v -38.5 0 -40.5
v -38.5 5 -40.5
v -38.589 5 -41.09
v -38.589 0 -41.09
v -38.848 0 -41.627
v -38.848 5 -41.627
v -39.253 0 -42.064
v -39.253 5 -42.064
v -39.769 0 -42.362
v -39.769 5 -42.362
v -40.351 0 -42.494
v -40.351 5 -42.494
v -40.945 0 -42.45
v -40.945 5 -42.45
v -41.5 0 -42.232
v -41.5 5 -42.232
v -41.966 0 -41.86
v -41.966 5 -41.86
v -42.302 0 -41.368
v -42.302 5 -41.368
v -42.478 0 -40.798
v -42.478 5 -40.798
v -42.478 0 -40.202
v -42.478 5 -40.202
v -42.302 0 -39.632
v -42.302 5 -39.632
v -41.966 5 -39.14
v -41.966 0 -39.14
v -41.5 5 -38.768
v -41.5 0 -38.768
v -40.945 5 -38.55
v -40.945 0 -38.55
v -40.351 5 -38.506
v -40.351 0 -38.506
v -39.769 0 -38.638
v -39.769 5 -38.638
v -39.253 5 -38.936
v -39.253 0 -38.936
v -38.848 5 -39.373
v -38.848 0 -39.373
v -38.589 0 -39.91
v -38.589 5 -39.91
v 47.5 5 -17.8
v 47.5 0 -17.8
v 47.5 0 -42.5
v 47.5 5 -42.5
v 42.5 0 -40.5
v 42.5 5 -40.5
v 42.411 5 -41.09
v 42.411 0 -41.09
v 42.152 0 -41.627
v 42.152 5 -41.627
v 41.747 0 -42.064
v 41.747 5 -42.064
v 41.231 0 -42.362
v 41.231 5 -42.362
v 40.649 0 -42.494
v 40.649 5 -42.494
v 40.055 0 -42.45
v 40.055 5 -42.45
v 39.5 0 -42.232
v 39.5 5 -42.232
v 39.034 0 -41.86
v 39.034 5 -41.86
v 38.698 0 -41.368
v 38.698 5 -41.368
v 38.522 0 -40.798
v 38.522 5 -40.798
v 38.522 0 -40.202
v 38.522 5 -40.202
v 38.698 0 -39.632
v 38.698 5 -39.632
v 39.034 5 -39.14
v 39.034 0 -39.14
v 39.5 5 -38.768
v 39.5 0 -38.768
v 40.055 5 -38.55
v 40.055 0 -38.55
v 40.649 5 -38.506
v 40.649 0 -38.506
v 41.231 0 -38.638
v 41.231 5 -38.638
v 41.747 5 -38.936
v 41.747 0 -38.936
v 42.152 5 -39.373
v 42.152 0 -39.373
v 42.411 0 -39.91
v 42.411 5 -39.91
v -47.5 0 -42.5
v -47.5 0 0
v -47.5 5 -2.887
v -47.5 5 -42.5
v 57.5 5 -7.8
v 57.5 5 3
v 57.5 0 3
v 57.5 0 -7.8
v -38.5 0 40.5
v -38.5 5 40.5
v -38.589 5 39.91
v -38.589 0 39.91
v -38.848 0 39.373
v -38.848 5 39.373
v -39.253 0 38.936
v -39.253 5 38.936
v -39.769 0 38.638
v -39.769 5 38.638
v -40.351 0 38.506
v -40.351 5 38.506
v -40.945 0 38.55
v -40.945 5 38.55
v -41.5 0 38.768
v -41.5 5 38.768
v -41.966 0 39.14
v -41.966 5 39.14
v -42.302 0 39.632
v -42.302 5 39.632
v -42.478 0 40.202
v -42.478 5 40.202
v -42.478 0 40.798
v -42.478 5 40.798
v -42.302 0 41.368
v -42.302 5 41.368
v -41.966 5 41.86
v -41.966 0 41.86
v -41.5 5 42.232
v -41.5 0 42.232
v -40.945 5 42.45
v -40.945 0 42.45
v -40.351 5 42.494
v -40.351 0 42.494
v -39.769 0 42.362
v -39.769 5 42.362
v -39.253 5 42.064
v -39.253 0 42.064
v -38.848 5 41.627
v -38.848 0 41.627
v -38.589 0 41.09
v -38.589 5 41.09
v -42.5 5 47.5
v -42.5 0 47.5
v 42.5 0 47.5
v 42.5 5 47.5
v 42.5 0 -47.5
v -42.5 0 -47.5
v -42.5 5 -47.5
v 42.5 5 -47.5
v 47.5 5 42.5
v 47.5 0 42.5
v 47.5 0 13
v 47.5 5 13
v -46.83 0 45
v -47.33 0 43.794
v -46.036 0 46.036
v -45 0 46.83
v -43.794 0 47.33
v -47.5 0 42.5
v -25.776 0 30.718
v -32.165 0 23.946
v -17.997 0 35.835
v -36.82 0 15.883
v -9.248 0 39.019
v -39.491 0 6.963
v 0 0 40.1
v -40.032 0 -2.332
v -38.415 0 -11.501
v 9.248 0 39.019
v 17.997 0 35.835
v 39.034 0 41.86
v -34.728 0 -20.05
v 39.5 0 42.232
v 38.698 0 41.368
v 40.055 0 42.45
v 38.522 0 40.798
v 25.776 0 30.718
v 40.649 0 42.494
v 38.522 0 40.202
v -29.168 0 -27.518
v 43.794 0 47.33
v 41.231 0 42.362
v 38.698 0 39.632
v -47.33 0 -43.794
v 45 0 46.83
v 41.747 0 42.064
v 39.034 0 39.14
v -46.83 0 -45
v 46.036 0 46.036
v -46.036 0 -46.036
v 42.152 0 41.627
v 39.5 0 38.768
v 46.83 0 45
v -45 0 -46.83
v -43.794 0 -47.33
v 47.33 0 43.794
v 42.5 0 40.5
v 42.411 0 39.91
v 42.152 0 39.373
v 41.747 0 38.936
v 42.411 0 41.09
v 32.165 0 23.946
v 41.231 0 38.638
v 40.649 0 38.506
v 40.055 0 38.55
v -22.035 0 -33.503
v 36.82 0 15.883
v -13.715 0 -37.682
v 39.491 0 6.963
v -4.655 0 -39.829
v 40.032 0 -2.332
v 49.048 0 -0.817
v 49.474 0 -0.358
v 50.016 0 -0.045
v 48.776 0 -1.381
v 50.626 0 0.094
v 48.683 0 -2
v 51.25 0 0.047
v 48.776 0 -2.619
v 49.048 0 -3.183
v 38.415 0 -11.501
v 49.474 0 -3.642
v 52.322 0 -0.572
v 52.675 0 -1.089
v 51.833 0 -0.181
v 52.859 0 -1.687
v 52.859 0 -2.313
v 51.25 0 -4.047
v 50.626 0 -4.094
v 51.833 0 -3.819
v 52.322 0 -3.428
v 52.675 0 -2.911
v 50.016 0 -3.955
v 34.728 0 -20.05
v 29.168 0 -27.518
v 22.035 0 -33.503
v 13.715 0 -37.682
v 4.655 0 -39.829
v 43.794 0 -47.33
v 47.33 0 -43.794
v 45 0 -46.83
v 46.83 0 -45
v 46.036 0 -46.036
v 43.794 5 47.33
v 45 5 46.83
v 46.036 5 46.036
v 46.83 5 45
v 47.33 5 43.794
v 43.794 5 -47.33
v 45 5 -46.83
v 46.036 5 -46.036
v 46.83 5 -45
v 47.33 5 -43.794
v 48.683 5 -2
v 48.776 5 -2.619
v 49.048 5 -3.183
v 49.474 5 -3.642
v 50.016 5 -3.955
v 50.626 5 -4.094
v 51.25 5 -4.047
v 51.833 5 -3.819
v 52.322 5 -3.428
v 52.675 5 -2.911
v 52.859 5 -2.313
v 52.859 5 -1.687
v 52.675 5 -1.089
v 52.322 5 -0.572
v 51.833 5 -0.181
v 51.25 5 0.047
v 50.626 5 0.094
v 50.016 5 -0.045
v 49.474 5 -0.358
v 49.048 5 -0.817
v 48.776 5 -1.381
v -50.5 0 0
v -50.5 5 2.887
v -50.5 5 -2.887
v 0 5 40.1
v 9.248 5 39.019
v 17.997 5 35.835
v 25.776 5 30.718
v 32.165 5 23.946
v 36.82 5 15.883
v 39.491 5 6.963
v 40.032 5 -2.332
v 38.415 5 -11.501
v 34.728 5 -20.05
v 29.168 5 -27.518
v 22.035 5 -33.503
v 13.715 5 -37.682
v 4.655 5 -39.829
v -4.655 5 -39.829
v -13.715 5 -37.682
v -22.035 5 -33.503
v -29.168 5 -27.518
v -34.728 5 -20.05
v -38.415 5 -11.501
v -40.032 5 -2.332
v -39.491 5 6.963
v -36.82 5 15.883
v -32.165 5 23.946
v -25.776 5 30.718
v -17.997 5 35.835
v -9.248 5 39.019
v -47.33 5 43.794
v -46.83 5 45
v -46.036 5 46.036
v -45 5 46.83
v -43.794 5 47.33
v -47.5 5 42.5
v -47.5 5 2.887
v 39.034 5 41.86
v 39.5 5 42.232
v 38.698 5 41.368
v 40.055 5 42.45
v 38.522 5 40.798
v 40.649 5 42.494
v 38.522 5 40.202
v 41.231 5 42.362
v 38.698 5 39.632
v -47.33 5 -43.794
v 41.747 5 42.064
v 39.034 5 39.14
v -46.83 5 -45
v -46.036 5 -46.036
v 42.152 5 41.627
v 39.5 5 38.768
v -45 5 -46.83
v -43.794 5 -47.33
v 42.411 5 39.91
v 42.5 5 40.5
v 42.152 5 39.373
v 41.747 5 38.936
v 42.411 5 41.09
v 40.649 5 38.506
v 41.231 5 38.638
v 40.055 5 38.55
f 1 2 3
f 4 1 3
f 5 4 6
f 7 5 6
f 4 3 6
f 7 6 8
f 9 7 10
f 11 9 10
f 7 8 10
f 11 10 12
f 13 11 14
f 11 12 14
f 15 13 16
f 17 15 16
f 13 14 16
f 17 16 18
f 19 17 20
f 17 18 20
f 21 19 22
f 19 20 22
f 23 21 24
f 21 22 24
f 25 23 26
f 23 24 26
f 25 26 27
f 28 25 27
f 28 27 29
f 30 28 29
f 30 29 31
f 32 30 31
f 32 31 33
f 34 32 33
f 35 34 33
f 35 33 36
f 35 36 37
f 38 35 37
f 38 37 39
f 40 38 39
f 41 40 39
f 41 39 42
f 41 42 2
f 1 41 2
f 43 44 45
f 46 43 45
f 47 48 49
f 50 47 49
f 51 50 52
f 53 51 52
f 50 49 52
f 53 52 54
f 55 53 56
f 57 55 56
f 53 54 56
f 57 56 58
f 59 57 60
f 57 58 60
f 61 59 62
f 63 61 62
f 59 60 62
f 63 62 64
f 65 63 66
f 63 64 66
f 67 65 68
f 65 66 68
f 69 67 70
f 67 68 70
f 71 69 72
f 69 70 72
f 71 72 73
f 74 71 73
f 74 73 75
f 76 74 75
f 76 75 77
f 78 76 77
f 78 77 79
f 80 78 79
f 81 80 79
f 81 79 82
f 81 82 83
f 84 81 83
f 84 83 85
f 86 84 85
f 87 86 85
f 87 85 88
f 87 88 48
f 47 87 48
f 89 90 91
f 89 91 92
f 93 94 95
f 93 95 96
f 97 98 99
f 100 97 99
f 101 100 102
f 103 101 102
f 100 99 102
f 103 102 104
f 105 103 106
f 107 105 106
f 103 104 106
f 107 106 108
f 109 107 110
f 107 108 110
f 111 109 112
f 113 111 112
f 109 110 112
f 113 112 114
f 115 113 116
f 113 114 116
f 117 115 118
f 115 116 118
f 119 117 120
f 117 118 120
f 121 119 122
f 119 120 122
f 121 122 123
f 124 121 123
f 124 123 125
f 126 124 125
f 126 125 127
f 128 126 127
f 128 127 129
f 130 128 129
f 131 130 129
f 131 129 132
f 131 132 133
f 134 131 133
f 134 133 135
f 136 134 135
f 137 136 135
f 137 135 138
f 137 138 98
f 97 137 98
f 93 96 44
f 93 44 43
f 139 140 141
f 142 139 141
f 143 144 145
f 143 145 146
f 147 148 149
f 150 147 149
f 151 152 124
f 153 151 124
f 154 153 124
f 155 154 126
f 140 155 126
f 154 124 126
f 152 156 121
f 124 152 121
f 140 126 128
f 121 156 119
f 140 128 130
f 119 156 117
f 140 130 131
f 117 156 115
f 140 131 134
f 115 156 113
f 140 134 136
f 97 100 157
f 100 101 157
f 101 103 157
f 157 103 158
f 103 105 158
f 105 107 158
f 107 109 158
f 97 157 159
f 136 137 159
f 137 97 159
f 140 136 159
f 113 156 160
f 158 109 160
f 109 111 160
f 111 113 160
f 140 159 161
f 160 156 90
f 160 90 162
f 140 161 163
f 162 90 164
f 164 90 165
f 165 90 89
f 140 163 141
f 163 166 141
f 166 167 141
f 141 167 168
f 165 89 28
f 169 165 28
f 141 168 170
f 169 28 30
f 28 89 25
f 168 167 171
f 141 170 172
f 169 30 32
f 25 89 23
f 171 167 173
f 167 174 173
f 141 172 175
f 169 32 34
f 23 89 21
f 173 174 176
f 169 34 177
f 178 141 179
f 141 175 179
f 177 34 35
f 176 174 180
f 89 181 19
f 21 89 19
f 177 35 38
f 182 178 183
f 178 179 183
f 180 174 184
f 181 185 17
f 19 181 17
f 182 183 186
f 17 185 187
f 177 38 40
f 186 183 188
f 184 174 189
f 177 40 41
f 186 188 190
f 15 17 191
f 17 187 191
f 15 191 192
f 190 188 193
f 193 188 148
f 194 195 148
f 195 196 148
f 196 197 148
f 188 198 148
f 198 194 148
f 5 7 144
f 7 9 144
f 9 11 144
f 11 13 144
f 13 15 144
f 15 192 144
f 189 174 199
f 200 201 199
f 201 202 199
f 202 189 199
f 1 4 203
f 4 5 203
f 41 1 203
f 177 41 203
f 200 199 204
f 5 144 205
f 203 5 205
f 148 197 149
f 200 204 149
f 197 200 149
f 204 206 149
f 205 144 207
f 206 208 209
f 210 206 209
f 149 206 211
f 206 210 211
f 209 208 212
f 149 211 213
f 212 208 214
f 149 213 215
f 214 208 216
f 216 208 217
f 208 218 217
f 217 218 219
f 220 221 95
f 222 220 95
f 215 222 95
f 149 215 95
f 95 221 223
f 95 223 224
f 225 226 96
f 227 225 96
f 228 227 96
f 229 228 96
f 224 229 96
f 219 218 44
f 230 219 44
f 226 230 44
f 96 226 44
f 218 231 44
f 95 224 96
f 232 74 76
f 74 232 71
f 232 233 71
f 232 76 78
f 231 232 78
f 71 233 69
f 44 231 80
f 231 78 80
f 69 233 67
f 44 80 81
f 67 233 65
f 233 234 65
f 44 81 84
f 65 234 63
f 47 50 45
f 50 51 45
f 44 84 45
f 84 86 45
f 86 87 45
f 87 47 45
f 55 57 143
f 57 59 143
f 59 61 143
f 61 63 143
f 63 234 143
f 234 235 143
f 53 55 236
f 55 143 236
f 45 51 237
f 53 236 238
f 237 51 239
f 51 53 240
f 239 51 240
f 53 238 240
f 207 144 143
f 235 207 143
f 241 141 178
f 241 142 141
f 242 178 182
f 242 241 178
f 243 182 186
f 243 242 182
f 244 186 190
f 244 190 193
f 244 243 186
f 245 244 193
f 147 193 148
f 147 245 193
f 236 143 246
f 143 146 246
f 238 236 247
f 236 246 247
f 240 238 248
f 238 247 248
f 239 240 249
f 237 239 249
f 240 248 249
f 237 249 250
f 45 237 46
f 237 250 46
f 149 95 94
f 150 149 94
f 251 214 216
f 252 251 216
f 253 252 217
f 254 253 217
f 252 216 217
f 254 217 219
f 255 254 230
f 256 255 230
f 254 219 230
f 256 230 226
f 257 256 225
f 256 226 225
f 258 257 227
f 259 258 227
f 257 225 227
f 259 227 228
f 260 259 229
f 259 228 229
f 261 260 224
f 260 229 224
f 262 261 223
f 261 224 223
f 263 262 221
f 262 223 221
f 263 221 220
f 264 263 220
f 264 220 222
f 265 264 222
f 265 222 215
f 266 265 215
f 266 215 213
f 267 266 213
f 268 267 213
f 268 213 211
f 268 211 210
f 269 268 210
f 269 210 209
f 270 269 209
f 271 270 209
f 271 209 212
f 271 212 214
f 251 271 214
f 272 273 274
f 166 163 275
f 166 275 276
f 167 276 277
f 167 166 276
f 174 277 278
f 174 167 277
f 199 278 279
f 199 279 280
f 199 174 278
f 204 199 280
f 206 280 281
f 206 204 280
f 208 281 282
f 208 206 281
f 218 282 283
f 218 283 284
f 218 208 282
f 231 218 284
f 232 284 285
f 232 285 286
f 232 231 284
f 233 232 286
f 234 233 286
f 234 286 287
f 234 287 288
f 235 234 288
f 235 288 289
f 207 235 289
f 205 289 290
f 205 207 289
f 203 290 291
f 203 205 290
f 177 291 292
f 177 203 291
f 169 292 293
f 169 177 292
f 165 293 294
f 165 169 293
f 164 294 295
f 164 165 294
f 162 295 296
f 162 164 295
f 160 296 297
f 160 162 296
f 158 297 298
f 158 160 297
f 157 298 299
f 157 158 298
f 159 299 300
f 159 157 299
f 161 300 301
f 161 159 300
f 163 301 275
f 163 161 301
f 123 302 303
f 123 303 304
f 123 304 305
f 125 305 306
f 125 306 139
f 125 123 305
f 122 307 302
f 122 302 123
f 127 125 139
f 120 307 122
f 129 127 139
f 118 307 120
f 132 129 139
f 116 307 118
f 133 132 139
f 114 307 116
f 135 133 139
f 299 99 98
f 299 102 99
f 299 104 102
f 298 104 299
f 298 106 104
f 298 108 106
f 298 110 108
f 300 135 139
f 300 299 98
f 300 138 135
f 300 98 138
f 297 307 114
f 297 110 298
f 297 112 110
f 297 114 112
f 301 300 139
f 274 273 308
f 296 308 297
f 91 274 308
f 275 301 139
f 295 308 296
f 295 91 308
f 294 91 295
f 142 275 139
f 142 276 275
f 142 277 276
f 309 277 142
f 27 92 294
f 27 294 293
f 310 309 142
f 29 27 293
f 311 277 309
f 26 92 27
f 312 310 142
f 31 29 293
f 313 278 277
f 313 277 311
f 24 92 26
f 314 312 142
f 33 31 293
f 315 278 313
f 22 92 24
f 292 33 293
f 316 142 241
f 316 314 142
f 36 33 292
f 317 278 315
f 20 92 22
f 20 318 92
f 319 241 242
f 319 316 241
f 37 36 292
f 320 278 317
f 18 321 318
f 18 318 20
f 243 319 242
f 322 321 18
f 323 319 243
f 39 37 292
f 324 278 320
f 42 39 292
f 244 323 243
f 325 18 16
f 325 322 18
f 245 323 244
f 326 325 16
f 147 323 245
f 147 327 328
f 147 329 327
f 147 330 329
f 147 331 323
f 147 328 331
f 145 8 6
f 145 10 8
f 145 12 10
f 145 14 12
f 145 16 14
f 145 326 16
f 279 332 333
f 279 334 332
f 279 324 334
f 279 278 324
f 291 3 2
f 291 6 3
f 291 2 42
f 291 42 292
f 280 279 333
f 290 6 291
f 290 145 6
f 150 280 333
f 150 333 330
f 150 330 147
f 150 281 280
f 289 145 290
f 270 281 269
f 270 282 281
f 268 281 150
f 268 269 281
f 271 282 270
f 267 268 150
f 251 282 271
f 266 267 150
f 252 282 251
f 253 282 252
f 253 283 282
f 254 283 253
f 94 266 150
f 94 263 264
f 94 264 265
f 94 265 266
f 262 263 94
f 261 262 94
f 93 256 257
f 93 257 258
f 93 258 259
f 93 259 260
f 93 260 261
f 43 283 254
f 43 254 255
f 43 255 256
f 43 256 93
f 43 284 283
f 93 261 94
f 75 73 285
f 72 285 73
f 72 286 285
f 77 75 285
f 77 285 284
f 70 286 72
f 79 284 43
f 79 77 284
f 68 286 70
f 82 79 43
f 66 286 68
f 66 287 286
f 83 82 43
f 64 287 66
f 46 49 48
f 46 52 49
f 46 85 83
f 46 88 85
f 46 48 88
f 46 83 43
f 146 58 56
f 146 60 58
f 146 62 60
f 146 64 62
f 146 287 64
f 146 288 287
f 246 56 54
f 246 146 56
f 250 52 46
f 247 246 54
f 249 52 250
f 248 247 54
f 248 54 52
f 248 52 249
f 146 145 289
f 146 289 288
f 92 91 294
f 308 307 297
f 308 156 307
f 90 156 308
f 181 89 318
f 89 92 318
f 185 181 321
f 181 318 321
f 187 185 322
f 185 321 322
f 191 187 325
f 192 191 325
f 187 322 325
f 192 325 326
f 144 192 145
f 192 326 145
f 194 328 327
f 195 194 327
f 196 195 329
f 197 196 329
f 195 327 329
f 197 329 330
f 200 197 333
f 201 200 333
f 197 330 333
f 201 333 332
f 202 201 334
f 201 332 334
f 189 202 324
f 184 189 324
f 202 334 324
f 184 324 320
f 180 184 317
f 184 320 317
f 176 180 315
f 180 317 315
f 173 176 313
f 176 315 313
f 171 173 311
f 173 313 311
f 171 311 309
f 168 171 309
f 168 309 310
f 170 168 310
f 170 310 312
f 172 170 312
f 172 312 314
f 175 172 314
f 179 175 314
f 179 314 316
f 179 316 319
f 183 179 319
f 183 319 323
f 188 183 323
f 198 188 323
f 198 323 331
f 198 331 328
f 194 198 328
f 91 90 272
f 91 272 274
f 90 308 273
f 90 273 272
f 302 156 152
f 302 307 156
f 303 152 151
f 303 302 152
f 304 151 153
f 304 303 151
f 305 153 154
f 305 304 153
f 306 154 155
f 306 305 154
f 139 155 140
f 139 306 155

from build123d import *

# Parameters (mm, degrees)
SKETCH1_W                       = 95
SKETCH1_H                       = 95
SKETCH1_W_2                     = 81
SKETCH1_H_2                     = 81
SKETCH1_R                       = 40.1
BOSS_EXTRUDE1_DEPTH             = 5
F_4_0MM_DOWEL_HOLE1_D           = 4
BOSS_EXTRUDE2_DEPTH             = 3
FILLET1_R                       = 5
SKETCH6_W                       = 3
SKETCH6_H                       = 5
SKETCH6_W_2                     = 4.8
BOSS_EXTRUDE3_DEPTH             = 10
TAP_DRILL_FOR_M5X0_8_TAP1_D     = 4.2
TAP_DRILL_FOR_M5X0_8_TAP1_DEPTH = 12
TAP_DRILL_FOR_M5X0_8_TAP1_TIP   = 1.2618073
CHAMFER1_SIZE                   = 10


with BuildPart() as part:
    # Sketch1 → Boss-Extrude1 (new body)
    # profile 1 of 2: a face of its own
    with BuildSketch(Plane(origin=(0, 0, 0), x_dir=(1, 0, 0), z_dir=(0, 1, 0))):
        Rectangle(SKETCH1_W, SKETCH1_H)
        Rectangle(SKETCH1_W_2, SKETCH1_H_2, mode=Mode.SUBTRACT)
    # profile 2 of 2: a face of its own
    with BuildSketch(Plane(origin=(0, 0, 0), x_dir=(1, 0, 0), z_dir=(0, 1, 0))):
        Rectangle(SKETCH1_W_2, SKETCH1_H_2)
        with Locations(Location((0, 0, 0), (0, 0, 270))):
            Circle(SKETCH1_R, mode=Mode.SUBTRACT)
    extrude(amount=BOSS_EXTRUDE1_DEPTH)

    # Ø4.0mm Dowel Hole1 (through all)
    with Locations(Plane(origin=(0, 0, 0), x_dir=(-1, 0, 0), z_dir=(0, -1, 0))):
        with Locations((40.5, -40.5), (-40.5, -40.5), (-40.5, 40.5), (40.5, 40.5)):
            Hole(F_4_0MM_DOWEL_HOLE1_D / 2)

    # Sketch5 → Boss-Extrude2 (add)
    with BuildSketch(Plane.ZY.offset(47.5)):
        Polygon((0, 0), (-2.886751346, 5), (2.886751346, 5), align=None)
    extrude(amount=BOSS_EXTRUDE2_DEPTH)

    # Fillet1
    fillet1_edges = [part.edges().sort_by_distance(p)[0] for p in [
        (-47.5, 2.5, 47.5),
        (-47.5, 2.5, -47.5),
        (47.5, 2.5, -47.5),
        (47.5, 2.5, 47.5),
    ]]
    fillet(fillet1_edges, radius=FILLET1_R)

    # Sketch6 → Boss-Extrude3 (add)
    with BuildSketch(Plane(origin=(47.5, 0, 0), x_dir=(0, 0, -1), z_dir=(1, 0, 0))):
        with Locations((-1.5, 2.5)):
            Rectangle(SKETCH6_W, SKETCH6_H)
        with Locations((2.4, 2.5)):
            Rectangle(SKETCH6_W_2, SKETCH6_H)
        with Locations((6.3, 2.5)):
            Rectangle(SKETCH6_W, SKETCH6_H)
    extrude(amount=BOSS_EXTRUDE3_DEPTH)

    # Tap Drill for M5x0.8 Tap1
    with Locations(Plane(origin=(0, 5, 0), x_dir=(1, 0, 0), z_dir=(0, 1, 0))):
        with Locations((50.782954503, 2)):
            Hole(TAP_DRILL_FOR_M5X0_8_TAP1_D / 2, depth=TAP_DRILL_FOR_M5X0_8_TAP1_DEPTH)
            with Locations((0, 0, -(TAP_DRILL_FOR_M5X0_8_TAP1_DEPTH + TAP_DRILL_FOR_M5X0_8_TAP1_TIP / 2))):  # 118° drill point
                Cone(0, TAP_DRILL_FOR_M5X0_8_TAP1_D / 2, TAP_DRILL_FOR_M5X0_8_TAP1_TIP, mode=Mode.SUBTRACT)

    # Chamfer1
    chamfer1_edges = [part.edges().sort_by_distance(p)[0] for p in [
        (47.5, 2.5, 3),
        (47.5, 2.5, -7.8),
    ]]
    chamfer(chamfer1_edges, length=CHAMFER1_SIZE - 0.0001)  # a hair under: the kernel refuses the full size


solid = part.part
